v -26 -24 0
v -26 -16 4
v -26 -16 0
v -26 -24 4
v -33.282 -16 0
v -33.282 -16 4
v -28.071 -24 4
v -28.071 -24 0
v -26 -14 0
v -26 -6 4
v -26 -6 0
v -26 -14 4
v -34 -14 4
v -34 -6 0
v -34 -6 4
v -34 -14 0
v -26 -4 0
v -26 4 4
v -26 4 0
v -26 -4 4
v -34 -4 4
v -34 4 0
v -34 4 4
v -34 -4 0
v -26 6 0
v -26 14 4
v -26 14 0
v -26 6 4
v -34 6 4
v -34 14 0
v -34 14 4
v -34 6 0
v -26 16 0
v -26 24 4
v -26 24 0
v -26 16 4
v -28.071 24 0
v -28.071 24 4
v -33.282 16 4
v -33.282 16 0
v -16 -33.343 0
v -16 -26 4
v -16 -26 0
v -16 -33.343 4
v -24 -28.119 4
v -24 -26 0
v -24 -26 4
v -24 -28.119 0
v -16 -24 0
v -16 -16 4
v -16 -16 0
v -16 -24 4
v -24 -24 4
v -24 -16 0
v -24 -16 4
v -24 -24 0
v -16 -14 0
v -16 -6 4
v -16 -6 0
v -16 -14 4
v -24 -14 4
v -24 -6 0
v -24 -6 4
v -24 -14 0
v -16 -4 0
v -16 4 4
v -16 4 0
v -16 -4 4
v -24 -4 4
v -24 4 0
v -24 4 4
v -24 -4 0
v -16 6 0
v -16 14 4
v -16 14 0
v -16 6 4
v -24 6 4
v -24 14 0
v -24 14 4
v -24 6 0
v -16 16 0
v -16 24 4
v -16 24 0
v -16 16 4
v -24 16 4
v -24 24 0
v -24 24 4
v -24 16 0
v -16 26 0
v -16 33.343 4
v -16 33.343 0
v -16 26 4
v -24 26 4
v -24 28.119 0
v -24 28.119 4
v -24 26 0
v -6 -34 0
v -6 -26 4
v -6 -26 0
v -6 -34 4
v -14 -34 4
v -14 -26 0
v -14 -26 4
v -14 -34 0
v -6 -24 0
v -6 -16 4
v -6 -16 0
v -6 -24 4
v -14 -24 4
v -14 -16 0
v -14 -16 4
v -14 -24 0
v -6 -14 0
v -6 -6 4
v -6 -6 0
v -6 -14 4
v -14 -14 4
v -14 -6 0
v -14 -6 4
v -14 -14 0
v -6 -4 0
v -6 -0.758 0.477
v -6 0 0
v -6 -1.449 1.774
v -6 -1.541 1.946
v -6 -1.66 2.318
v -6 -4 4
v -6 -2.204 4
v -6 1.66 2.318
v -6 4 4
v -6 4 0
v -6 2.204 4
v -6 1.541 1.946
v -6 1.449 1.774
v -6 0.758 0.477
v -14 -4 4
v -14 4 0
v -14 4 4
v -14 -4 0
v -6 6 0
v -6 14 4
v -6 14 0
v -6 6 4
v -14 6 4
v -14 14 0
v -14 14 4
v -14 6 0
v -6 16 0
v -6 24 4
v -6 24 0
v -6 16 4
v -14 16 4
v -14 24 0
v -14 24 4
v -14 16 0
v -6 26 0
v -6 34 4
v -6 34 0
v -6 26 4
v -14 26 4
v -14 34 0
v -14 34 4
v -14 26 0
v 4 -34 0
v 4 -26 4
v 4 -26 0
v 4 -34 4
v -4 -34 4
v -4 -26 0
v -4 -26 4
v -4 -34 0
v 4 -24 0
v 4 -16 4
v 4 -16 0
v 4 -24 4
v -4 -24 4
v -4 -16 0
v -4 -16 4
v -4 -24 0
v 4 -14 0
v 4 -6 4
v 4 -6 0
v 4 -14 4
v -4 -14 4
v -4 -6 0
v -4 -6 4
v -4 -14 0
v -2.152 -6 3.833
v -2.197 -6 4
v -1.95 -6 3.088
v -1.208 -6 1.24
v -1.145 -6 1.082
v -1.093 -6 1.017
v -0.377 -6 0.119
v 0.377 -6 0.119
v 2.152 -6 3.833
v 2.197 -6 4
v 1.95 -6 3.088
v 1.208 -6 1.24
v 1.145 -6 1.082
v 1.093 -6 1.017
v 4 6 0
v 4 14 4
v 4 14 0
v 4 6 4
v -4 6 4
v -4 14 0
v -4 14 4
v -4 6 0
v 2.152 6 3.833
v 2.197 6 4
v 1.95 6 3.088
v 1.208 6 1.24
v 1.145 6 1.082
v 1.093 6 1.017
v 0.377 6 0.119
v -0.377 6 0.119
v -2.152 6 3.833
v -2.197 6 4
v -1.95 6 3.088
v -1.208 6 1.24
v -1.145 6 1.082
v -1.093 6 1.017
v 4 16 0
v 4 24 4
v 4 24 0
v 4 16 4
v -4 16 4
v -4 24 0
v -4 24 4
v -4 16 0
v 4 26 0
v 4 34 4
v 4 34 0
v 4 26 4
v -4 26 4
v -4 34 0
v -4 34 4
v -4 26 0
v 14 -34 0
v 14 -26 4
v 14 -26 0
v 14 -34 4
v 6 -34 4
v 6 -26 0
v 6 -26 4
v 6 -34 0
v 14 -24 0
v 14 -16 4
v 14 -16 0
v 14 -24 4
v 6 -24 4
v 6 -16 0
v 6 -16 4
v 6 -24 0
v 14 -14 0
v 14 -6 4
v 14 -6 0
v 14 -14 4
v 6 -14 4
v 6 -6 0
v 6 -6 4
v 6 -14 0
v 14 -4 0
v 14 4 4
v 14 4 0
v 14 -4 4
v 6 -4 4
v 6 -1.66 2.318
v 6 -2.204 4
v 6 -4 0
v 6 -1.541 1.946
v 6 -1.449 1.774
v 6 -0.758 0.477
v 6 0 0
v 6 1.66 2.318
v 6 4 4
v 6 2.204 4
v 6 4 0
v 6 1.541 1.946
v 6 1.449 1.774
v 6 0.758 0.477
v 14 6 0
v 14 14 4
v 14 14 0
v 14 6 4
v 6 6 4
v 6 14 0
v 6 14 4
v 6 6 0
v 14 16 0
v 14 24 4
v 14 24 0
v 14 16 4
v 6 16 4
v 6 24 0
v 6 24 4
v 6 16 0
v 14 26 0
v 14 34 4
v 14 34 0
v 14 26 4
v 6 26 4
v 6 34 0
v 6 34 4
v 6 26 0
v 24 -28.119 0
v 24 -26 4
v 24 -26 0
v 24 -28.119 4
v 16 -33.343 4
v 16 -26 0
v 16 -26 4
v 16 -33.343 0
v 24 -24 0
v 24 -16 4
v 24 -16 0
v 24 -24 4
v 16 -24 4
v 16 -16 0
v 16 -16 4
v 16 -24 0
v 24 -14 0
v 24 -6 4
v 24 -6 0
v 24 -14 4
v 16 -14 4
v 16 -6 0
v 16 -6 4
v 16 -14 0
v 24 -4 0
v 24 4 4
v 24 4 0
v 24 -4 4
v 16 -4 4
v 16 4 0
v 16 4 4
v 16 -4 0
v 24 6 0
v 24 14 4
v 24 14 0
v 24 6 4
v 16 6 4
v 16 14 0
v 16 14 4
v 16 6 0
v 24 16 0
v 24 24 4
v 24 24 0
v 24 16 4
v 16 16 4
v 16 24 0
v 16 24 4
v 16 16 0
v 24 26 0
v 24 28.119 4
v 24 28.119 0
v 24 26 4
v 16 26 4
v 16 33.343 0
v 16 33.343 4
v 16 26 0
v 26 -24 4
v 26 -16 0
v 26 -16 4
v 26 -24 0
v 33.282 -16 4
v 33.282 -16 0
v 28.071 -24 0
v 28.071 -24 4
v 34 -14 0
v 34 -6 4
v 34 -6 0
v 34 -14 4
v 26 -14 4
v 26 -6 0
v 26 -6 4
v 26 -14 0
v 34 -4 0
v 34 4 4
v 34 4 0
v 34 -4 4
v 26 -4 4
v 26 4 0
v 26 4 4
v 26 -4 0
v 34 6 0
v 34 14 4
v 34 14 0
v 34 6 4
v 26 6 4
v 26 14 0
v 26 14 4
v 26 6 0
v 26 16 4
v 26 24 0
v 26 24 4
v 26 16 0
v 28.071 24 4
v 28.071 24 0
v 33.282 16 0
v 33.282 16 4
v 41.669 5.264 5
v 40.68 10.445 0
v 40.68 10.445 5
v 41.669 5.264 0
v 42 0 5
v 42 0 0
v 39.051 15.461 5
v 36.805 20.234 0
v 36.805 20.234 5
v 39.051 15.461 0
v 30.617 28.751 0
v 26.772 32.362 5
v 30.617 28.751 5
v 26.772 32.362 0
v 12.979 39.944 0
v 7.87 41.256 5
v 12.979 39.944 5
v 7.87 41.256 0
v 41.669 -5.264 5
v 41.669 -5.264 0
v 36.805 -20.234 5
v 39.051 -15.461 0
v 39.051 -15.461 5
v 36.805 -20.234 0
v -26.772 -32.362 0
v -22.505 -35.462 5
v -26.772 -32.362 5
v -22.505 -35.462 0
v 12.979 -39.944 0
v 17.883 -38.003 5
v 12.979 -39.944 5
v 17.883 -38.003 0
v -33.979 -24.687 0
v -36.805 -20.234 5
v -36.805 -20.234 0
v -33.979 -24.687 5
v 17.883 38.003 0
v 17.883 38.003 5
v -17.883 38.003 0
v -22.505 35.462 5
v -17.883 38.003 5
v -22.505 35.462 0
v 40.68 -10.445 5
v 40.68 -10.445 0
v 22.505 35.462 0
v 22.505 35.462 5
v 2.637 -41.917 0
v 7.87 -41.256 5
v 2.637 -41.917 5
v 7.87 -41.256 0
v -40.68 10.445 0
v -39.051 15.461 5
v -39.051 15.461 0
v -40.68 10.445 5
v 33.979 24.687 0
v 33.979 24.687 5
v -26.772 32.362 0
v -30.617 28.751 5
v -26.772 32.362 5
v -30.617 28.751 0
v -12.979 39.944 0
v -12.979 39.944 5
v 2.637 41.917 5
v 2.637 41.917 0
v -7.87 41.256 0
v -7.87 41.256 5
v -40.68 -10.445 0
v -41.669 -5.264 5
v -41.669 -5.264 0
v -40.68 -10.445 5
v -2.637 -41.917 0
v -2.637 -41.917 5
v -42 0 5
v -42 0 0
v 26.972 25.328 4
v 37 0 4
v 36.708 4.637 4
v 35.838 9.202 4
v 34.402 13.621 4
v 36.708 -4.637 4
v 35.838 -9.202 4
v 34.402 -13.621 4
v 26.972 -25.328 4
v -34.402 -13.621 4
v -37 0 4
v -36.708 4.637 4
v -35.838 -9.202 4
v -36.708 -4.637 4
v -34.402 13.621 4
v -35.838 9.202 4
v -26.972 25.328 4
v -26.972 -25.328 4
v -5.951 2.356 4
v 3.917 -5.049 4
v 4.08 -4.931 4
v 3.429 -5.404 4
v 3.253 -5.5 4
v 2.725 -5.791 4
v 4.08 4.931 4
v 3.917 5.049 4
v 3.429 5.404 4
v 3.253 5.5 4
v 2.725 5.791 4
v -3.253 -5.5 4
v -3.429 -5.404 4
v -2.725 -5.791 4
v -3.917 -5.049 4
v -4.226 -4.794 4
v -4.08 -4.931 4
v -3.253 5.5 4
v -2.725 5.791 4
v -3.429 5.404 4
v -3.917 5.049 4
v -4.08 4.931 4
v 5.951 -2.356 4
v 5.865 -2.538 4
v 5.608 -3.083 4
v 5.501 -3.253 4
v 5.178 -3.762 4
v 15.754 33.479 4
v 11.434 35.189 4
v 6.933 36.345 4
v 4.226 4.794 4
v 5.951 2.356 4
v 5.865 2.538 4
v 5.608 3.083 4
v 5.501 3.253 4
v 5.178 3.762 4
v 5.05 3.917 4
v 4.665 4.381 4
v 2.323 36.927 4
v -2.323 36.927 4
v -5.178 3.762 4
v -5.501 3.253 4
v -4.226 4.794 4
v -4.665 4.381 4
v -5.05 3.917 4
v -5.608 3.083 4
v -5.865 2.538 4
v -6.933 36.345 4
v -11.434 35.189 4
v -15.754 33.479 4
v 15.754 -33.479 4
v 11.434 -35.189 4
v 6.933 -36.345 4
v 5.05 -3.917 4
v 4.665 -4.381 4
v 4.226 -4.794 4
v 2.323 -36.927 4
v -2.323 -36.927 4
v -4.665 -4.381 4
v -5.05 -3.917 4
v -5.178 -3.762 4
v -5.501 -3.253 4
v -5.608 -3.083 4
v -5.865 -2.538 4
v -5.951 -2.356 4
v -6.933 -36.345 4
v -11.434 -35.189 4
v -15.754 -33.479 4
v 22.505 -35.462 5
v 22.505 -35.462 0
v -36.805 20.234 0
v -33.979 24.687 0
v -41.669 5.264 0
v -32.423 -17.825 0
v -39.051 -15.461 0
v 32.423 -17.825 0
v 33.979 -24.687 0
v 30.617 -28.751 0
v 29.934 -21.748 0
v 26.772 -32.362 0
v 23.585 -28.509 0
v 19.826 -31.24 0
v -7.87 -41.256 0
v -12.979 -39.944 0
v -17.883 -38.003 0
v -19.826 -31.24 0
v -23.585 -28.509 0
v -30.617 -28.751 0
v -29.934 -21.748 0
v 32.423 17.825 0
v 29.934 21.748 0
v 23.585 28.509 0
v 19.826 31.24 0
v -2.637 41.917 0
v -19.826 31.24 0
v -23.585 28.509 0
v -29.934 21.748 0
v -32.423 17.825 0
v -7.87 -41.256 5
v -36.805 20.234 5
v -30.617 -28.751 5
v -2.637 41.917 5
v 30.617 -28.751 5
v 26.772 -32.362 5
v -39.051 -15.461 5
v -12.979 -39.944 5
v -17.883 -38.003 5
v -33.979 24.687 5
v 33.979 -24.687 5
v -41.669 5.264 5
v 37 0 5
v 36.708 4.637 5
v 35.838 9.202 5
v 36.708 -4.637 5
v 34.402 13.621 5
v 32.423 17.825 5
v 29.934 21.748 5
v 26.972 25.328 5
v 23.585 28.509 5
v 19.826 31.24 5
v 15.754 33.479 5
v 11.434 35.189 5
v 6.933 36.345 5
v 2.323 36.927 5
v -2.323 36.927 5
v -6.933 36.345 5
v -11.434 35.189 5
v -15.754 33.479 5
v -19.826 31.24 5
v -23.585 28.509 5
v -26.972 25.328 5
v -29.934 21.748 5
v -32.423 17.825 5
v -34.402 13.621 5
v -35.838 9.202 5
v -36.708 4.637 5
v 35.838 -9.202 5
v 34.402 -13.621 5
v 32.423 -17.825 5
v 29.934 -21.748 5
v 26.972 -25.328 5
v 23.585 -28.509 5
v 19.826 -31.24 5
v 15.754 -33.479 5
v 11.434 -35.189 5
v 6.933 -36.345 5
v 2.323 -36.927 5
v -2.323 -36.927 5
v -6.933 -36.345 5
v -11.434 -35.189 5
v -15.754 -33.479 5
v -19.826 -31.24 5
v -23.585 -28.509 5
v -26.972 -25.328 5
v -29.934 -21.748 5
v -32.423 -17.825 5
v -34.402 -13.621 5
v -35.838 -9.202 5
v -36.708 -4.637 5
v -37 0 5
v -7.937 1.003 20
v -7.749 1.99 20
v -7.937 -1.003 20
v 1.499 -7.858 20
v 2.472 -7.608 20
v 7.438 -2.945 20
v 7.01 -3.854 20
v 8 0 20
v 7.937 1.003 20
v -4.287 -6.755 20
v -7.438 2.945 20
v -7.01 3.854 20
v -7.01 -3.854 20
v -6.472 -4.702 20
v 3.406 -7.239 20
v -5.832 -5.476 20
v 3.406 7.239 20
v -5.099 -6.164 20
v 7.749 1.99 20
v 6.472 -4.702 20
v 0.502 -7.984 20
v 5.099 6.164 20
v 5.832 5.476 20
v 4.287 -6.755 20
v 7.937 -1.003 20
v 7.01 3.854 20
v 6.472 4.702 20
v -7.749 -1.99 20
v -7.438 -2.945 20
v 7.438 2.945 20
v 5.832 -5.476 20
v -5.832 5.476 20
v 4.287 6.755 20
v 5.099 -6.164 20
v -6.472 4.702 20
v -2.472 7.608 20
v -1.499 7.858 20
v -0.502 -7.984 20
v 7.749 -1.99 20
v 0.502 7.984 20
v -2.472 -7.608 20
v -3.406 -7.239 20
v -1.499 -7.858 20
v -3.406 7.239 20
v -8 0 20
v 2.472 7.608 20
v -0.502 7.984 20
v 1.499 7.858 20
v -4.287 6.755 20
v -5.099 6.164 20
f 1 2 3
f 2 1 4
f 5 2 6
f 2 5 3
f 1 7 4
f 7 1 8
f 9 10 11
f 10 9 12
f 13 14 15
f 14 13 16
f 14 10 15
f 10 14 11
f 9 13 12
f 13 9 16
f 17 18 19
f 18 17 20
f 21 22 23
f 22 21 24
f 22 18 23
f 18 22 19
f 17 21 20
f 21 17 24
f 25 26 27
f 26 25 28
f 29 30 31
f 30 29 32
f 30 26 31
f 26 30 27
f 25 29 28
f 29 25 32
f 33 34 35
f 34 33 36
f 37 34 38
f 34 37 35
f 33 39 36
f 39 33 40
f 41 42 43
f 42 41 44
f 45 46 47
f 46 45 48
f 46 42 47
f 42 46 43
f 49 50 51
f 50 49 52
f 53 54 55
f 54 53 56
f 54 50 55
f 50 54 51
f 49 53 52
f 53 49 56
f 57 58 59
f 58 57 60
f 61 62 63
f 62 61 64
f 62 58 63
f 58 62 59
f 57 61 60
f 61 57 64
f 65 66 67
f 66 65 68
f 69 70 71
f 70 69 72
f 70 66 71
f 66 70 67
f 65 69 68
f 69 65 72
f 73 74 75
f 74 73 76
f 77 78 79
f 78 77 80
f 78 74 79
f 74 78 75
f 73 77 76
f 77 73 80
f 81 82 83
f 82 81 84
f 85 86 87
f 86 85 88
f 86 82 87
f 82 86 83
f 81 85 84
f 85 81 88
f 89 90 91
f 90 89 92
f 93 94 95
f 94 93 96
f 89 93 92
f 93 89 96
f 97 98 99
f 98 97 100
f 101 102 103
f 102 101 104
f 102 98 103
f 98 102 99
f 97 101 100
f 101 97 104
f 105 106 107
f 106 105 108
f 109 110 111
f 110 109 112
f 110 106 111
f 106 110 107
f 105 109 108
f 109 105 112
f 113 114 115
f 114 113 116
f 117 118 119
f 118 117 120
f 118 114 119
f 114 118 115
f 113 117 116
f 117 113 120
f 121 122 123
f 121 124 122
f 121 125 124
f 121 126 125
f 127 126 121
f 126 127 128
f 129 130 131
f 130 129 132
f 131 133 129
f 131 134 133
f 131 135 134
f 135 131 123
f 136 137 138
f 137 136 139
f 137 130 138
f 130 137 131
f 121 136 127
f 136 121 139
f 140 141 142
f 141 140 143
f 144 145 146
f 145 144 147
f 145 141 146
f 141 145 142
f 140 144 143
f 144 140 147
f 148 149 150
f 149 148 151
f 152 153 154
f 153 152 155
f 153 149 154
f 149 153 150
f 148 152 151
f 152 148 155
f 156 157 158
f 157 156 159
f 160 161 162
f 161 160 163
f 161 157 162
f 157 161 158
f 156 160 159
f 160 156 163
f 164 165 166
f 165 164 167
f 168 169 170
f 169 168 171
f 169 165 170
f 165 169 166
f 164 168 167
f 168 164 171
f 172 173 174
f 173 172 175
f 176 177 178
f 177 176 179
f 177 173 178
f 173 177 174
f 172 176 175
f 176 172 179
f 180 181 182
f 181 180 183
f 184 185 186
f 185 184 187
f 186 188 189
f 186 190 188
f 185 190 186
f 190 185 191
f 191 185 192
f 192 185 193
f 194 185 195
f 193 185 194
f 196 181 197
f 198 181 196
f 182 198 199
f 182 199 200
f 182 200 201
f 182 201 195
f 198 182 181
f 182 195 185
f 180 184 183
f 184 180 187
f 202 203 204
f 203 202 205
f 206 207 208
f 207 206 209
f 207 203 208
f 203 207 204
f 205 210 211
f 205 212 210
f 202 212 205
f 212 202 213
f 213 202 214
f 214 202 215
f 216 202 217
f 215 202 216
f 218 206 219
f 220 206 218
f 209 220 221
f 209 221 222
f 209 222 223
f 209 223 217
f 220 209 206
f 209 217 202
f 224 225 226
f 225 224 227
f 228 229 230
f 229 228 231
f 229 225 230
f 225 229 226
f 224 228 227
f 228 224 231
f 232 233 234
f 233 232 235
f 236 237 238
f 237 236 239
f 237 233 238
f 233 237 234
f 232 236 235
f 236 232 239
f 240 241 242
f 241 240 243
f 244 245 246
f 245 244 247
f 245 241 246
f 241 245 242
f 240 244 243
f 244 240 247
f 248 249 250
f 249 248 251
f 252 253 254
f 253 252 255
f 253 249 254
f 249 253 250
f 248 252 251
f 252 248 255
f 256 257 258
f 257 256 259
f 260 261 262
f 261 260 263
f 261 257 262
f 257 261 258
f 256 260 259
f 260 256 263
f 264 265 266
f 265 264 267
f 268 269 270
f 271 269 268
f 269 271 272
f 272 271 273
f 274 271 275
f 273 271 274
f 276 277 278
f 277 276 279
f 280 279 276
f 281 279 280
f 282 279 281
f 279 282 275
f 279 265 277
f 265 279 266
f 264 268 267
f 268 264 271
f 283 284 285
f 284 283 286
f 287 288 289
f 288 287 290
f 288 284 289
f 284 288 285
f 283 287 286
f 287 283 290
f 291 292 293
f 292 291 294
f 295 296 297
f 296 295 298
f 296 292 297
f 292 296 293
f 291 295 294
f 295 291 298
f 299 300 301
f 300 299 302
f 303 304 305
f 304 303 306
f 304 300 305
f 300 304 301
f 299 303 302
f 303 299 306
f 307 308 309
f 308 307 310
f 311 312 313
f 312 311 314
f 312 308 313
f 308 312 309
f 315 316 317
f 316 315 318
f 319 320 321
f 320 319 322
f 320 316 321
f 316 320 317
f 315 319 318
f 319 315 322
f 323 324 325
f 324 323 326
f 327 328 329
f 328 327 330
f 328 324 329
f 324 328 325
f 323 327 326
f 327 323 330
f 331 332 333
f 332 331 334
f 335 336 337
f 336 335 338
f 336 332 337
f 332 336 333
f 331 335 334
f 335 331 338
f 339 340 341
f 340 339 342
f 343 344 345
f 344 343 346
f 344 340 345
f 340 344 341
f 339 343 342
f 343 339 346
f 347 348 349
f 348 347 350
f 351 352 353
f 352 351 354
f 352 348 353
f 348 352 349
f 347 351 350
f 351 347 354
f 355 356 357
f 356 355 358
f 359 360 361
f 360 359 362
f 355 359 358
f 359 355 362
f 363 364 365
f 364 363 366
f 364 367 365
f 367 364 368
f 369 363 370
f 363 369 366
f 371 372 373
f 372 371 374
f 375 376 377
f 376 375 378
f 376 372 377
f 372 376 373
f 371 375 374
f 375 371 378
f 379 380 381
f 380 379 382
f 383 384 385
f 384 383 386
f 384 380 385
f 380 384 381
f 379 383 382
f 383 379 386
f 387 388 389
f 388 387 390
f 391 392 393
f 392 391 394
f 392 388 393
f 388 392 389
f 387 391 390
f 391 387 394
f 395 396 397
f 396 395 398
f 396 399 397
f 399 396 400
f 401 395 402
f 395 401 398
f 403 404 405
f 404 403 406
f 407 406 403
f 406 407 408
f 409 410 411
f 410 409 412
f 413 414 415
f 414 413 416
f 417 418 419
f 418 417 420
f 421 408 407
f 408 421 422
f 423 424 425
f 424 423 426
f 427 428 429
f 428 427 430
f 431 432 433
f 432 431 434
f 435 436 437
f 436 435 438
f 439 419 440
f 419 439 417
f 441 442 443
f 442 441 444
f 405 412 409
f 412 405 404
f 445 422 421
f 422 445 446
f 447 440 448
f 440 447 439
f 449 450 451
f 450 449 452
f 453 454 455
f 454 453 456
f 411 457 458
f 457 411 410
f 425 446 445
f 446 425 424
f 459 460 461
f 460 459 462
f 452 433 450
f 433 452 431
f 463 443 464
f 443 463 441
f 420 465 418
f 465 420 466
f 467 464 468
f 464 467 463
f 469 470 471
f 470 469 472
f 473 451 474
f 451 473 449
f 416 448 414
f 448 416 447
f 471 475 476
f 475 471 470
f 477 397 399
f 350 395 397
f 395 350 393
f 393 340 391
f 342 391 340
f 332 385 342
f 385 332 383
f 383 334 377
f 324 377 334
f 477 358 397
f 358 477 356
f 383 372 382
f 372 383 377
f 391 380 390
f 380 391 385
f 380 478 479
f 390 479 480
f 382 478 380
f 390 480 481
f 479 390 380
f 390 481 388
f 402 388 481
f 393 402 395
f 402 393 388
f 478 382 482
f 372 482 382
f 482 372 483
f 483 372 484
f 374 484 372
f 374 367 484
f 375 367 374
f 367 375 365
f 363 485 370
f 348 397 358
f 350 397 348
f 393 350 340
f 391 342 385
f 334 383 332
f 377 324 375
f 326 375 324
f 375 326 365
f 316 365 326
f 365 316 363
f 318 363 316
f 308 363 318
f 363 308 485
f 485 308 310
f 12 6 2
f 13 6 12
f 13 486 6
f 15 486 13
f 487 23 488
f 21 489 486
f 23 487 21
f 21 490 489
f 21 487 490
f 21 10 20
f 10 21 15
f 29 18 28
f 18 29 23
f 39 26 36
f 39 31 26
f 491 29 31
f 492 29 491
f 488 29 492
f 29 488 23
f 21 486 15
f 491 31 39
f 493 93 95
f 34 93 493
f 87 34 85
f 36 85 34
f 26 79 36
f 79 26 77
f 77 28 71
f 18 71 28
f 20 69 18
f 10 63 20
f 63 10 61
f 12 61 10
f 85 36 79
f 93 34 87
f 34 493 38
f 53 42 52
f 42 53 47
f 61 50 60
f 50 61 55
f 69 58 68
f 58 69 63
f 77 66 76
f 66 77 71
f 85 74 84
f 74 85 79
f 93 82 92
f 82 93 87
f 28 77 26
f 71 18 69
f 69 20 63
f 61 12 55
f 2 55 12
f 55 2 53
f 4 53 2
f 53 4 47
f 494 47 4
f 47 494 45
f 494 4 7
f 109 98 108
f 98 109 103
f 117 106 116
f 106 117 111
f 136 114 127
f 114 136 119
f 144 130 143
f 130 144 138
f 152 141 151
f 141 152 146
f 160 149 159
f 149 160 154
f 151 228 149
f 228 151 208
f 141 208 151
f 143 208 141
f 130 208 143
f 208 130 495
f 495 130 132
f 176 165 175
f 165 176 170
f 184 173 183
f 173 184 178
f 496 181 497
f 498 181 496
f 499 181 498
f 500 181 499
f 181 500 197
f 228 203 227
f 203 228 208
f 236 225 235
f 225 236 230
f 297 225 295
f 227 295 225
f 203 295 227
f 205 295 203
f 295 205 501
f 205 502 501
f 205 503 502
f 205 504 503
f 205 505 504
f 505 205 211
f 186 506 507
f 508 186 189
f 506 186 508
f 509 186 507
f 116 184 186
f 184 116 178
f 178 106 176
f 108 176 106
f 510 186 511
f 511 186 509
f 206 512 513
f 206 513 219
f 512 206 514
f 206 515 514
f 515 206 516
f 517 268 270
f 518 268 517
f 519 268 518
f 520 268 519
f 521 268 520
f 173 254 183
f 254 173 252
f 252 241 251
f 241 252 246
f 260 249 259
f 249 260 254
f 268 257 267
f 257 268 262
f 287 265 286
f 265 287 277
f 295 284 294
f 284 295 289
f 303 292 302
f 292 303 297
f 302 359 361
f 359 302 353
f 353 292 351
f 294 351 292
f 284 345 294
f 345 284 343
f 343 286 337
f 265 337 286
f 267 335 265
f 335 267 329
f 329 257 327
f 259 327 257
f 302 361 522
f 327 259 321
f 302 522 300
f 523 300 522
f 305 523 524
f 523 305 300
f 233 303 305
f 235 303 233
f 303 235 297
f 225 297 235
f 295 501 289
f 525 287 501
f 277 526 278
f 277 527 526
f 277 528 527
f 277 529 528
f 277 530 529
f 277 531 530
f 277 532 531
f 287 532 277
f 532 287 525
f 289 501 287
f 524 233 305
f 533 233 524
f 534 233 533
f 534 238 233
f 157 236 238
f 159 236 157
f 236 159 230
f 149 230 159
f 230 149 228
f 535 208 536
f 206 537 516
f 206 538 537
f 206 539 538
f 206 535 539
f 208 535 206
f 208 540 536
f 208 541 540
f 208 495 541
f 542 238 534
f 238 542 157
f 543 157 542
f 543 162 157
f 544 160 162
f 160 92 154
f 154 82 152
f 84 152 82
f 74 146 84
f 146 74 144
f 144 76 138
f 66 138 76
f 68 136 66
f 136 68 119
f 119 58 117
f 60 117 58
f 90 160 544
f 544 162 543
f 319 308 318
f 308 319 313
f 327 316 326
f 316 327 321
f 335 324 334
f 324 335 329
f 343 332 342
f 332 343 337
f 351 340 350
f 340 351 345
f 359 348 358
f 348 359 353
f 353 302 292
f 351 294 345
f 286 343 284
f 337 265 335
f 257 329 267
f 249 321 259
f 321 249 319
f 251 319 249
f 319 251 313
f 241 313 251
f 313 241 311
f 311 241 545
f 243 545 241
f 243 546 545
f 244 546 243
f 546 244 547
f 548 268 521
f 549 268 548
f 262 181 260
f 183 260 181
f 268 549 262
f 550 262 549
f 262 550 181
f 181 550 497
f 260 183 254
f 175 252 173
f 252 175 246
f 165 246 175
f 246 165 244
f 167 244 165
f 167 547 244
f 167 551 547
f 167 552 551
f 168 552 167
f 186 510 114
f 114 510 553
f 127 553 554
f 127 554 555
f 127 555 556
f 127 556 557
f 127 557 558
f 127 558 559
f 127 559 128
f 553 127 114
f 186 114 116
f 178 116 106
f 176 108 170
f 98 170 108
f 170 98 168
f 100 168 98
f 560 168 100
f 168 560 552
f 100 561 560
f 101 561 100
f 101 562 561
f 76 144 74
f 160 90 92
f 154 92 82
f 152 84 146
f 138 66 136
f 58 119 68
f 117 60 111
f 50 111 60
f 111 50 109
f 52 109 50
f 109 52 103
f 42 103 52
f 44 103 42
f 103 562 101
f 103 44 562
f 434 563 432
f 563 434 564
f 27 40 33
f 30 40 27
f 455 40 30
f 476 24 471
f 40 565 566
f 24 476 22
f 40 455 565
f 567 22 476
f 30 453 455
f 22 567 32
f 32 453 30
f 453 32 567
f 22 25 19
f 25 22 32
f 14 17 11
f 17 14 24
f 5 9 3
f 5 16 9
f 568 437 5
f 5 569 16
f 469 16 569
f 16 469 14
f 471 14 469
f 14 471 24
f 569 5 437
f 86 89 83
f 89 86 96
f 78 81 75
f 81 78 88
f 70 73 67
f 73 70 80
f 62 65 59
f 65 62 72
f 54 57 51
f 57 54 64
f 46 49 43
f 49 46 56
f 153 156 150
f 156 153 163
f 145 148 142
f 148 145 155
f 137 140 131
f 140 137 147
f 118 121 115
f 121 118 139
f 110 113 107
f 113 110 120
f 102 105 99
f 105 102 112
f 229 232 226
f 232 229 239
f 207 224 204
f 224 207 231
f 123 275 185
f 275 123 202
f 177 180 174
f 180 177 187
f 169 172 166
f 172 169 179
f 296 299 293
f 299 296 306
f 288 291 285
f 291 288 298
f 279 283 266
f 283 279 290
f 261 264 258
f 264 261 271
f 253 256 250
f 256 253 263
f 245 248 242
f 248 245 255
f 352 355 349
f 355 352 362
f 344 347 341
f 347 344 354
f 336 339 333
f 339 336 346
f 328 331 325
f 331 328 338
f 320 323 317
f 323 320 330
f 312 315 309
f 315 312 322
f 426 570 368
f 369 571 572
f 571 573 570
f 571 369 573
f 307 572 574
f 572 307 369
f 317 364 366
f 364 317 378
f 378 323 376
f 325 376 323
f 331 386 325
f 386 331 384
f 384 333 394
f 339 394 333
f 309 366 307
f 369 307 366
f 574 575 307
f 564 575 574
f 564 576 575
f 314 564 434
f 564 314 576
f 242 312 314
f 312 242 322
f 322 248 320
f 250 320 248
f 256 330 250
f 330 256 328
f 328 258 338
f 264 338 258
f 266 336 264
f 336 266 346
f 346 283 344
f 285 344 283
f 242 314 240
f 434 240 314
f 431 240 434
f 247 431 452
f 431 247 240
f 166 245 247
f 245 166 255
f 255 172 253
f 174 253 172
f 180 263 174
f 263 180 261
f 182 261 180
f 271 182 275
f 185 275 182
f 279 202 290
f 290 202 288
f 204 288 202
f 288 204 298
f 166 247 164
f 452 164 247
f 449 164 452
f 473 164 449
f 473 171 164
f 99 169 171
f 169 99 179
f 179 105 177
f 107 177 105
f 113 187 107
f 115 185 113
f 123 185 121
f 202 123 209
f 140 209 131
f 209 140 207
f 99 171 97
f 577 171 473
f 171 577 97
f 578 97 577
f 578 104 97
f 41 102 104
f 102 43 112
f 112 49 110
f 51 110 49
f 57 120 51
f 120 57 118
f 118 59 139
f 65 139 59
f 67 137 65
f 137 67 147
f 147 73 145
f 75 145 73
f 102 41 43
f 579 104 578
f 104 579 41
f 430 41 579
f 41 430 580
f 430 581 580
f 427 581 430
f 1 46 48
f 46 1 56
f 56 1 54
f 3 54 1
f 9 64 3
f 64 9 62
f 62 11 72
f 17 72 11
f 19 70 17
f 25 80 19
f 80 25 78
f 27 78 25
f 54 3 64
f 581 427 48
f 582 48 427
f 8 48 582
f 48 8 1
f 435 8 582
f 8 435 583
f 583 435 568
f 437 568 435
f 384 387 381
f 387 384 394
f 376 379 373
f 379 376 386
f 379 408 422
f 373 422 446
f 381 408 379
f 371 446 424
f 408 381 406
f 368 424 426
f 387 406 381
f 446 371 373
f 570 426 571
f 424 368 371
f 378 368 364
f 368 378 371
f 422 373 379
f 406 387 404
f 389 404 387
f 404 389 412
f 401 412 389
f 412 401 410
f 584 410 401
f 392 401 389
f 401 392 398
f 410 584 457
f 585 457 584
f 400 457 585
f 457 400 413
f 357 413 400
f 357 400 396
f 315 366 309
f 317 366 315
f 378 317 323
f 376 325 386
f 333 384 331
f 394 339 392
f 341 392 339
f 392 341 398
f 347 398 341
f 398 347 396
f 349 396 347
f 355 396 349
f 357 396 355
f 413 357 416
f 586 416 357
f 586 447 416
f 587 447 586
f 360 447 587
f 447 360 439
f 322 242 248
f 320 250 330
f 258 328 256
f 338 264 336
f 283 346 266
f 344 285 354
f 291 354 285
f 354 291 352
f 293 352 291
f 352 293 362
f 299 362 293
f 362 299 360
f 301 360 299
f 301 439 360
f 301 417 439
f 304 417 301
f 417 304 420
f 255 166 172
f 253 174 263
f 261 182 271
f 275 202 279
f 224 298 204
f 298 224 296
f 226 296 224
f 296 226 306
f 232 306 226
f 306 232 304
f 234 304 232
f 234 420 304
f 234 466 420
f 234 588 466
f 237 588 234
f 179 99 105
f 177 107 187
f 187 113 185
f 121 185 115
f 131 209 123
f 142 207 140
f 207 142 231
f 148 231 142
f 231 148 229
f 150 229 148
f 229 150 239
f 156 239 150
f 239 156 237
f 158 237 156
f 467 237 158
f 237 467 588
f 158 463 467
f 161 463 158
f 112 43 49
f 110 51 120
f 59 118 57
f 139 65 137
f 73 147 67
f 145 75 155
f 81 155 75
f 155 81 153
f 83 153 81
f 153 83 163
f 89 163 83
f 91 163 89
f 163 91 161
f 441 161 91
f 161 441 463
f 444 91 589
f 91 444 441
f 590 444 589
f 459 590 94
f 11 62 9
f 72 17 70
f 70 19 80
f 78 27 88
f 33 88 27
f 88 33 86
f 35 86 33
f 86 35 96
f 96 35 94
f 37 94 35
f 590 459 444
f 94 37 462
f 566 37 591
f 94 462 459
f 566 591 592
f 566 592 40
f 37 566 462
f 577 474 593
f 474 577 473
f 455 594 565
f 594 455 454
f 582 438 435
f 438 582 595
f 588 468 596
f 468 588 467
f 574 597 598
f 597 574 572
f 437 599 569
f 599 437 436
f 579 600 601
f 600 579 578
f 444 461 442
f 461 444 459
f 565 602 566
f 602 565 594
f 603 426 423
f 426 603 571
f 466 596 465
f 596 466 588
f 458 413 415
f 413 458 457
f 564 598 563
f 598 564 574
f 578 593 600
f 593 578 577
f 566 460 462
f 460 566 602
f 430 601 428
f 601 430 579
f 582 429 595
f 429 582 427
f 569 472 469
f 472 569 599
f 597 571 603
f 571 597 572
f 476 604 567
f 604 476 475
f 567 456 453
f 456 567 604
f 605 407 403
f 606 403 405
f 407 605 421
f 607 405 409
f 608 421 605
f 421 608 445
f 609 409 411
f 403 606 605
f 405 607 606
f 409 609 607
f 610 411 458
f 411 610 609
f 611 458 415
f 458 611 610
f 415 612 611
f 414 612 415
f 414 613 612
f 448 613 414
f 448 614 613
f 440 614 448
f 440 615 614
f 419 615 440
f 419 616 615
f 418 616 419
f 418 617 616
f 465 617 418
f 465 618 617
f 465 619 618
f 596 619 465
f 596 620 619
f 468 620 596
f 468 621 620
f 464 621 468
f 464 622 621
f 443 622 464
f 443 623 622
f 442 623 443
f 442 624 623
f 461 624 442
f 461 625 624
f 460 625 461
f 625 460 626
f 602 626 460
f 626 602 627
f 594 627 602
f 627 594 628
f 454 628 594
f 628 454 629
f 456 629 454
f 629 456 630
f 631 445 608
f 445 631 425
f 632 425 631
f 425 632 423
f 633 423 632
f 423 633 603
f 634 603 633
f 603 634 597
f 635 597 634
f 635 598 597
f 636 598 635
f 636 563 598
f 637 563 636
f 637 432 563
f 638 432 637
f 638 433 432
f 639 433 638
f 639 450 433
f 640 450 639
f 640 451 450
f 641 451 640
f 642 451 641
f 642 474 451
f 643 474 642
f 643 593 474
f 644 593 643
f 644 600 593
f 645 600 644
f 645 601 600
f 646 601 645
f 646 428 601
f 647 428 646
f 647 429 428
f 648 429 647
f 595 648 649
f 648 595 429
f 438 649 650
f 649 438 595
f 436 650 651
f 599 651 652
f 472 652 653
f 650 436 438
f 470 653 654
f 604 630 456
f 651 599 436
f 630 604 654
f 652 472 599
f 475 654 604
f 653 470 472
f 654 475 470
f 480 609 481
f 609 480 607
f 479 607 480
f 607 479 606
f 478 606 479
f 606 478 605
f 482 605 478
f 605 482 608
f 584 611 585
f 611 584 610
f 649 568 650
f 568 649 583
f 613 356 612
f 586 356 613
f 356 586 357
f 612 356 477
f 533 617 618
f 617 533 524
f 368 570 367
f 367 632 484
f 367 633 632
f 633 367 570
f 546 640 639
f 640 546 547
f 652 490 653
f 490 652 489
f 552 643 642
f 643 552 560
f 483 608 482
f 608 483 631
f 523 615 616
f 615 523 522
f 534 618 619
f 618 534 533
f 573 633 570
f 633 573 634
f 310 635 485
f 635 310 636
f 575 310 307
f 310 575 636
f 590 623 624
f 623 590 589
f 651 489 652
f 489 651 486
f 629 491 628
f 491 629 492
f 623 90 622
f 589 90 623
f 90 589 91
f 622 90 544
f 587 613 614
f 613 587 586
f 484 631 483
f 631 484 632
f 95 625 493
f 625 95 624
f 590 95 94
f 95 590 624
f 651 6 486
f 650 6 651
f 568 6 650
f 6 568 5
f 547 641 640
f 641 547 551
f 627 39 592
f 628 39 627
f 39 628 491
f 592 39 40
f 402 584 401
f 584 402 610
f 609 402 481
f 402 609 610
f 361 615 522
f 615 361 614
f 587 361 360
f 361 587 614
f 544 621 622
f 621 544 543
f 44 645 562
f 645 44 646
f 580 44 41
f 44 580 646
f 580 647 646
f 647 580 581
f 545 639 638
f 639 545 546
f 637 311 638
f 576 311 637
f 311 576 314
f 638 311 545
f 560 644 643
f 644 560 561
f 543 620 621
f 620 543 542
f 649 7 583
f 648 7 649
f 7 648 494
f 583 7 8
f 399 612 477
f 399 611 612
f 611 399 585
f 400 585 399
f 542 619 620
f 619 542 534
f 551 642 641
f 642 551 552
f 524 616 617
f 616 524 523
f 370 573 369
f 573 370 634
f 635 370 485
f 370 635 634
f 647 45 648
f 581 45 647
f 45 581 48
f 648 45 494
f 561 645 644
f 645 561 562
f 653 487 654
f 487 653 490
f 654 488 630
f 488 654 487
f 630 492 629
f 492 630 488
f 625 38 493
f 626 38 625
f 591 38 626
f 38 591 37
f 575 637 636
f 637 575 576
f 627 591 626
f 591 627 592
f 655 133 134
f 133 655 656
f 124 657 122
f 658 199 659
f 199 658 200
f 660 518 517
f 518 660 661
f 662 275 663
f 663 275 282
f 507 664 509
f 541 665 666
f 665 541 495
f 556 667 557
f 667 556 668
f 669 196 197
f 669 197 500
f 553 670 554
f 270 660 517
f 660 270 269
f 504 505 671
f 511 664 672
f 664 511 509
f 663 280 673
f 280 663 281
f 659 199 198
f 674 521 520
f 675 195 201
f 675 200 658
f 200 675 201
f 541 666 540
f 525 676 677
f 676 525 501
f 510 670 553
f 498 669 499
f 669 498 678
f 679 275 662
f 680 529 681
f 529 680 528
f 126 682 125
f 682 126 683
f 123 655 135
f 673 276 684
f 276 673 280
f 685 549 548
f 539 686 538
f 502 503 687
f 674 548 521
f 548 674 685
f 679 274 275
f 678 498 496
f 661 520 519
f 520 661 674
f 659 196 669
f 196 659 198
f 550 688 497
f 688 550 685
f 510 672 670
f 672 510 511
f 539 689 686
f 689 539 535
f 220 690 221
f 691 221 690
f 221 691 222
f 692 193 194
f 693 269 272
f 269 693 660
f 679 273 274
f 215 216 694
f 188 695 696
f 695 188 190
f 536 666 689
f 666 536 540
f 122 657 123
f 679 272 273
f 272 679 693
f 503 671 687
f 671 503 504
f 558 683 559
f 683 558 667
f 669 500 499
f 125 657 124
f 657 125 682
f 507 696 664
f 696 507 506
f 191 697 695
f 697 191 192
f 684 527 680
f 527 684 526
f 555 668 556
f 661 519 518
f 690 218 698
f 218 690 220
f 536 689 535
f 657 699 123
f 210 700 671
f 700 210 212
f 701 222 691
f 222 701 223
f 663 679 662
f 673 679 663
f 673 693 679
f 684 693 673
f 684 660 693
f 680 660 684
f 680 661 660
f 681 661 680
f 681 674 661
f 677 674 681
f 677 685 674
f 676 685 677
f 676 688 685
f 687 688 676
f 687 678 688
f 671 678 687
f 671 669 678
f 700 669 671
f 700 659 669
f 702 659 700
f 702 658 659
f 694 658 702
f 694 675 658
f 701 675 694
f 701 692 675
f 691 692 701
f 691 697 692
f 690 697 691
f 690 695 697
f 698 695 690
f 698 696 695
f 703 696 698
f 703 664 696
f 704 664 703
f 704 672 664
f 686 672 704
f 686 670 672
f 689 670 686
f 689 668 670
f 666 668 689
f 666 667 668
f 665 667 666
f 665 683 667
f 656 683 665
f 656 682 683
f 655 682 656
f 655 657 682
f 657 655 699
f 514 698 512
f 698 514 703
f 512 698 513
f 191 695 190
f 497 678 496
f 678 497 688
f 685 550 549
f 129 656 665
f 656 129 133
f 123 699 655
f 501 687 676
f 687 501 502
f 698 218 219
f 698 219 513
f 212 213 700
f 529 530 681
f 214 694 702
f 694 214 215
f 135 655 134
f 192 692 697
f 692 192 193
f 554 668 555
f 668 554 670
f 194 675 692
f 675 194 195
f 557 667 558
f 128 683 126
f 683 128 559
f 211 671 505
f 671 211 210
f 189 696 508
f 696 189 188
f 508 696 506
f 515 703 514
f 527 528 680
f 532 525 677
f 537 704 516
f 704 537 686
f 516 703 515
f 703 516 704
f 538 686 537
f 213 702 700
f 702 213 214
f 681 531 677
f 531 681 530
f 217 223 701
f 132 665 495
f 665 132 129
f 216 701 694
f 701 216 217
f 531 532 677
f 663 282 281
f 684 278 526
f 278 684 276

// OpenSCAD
// sink drain diameter
1_drain_diameter = 84; // [50:100]

// outer ring height
2_rim_height = 5; // [4:6]
// outer ring width
3_rim_width = 5; // [4:8]

// trap grid height
4_mesh_height = 4; // [2:4]
// grid line thickness
5_mesh_thickness = 2; // [1:4]
// grid hole width
6_mesh_hole_width = 8; // [6:10]

// handle height
7_handle_height = 20; // [10:30]
// handle top diameter
8_handle_diameter = 16; // [14:20]

function polar_dist(x, y) = sqrt(pow(x, 2) + pow(y, 2));

mesh_spacing = 6_mesh_hole_width + 5_mesh_thickness;
num_holes = floor((1_drain_diameter/2)/mesh_spacing);

$fn=50;

union()
{
    // Mesh
    difference()
    {
        cylinder(r=1_drain_diameter/2, h=4_mesh_height);

        for (x = [-num_holes:num_holes])
        {
            for (y = [-num_holes:num_holes])
            {
                if (polar_dist(x * mesh_spacing, y * mesh_spacing) < (1_drain_diameter / 2) - 3_rim_width)
                {
                    translate([
                        x * mesh_spacing,
                        y * mesh_spacing,
                        4_mesh_height/2])
                    cube([6_mesh_hole_width, 6_mesh_hole_width, 4_mesh_height+0.1], center=true);
                }
            }
        }
    }

    // Rim
    difference()
    {
        cylinder(r=1_drain_diameter/2, h=2_rim_height);

        translate([0, 0, -0.05])
        cylinder(r=1_drain_diameter/2-3_rim_width, h=2_rim_height+0.1);
    }

    // Handle
    cylinder(r1=6_mesh_hole_width/2+5_mesh_thickness, r2=8_handle_diameter/2, h=7_handle_height);
}
